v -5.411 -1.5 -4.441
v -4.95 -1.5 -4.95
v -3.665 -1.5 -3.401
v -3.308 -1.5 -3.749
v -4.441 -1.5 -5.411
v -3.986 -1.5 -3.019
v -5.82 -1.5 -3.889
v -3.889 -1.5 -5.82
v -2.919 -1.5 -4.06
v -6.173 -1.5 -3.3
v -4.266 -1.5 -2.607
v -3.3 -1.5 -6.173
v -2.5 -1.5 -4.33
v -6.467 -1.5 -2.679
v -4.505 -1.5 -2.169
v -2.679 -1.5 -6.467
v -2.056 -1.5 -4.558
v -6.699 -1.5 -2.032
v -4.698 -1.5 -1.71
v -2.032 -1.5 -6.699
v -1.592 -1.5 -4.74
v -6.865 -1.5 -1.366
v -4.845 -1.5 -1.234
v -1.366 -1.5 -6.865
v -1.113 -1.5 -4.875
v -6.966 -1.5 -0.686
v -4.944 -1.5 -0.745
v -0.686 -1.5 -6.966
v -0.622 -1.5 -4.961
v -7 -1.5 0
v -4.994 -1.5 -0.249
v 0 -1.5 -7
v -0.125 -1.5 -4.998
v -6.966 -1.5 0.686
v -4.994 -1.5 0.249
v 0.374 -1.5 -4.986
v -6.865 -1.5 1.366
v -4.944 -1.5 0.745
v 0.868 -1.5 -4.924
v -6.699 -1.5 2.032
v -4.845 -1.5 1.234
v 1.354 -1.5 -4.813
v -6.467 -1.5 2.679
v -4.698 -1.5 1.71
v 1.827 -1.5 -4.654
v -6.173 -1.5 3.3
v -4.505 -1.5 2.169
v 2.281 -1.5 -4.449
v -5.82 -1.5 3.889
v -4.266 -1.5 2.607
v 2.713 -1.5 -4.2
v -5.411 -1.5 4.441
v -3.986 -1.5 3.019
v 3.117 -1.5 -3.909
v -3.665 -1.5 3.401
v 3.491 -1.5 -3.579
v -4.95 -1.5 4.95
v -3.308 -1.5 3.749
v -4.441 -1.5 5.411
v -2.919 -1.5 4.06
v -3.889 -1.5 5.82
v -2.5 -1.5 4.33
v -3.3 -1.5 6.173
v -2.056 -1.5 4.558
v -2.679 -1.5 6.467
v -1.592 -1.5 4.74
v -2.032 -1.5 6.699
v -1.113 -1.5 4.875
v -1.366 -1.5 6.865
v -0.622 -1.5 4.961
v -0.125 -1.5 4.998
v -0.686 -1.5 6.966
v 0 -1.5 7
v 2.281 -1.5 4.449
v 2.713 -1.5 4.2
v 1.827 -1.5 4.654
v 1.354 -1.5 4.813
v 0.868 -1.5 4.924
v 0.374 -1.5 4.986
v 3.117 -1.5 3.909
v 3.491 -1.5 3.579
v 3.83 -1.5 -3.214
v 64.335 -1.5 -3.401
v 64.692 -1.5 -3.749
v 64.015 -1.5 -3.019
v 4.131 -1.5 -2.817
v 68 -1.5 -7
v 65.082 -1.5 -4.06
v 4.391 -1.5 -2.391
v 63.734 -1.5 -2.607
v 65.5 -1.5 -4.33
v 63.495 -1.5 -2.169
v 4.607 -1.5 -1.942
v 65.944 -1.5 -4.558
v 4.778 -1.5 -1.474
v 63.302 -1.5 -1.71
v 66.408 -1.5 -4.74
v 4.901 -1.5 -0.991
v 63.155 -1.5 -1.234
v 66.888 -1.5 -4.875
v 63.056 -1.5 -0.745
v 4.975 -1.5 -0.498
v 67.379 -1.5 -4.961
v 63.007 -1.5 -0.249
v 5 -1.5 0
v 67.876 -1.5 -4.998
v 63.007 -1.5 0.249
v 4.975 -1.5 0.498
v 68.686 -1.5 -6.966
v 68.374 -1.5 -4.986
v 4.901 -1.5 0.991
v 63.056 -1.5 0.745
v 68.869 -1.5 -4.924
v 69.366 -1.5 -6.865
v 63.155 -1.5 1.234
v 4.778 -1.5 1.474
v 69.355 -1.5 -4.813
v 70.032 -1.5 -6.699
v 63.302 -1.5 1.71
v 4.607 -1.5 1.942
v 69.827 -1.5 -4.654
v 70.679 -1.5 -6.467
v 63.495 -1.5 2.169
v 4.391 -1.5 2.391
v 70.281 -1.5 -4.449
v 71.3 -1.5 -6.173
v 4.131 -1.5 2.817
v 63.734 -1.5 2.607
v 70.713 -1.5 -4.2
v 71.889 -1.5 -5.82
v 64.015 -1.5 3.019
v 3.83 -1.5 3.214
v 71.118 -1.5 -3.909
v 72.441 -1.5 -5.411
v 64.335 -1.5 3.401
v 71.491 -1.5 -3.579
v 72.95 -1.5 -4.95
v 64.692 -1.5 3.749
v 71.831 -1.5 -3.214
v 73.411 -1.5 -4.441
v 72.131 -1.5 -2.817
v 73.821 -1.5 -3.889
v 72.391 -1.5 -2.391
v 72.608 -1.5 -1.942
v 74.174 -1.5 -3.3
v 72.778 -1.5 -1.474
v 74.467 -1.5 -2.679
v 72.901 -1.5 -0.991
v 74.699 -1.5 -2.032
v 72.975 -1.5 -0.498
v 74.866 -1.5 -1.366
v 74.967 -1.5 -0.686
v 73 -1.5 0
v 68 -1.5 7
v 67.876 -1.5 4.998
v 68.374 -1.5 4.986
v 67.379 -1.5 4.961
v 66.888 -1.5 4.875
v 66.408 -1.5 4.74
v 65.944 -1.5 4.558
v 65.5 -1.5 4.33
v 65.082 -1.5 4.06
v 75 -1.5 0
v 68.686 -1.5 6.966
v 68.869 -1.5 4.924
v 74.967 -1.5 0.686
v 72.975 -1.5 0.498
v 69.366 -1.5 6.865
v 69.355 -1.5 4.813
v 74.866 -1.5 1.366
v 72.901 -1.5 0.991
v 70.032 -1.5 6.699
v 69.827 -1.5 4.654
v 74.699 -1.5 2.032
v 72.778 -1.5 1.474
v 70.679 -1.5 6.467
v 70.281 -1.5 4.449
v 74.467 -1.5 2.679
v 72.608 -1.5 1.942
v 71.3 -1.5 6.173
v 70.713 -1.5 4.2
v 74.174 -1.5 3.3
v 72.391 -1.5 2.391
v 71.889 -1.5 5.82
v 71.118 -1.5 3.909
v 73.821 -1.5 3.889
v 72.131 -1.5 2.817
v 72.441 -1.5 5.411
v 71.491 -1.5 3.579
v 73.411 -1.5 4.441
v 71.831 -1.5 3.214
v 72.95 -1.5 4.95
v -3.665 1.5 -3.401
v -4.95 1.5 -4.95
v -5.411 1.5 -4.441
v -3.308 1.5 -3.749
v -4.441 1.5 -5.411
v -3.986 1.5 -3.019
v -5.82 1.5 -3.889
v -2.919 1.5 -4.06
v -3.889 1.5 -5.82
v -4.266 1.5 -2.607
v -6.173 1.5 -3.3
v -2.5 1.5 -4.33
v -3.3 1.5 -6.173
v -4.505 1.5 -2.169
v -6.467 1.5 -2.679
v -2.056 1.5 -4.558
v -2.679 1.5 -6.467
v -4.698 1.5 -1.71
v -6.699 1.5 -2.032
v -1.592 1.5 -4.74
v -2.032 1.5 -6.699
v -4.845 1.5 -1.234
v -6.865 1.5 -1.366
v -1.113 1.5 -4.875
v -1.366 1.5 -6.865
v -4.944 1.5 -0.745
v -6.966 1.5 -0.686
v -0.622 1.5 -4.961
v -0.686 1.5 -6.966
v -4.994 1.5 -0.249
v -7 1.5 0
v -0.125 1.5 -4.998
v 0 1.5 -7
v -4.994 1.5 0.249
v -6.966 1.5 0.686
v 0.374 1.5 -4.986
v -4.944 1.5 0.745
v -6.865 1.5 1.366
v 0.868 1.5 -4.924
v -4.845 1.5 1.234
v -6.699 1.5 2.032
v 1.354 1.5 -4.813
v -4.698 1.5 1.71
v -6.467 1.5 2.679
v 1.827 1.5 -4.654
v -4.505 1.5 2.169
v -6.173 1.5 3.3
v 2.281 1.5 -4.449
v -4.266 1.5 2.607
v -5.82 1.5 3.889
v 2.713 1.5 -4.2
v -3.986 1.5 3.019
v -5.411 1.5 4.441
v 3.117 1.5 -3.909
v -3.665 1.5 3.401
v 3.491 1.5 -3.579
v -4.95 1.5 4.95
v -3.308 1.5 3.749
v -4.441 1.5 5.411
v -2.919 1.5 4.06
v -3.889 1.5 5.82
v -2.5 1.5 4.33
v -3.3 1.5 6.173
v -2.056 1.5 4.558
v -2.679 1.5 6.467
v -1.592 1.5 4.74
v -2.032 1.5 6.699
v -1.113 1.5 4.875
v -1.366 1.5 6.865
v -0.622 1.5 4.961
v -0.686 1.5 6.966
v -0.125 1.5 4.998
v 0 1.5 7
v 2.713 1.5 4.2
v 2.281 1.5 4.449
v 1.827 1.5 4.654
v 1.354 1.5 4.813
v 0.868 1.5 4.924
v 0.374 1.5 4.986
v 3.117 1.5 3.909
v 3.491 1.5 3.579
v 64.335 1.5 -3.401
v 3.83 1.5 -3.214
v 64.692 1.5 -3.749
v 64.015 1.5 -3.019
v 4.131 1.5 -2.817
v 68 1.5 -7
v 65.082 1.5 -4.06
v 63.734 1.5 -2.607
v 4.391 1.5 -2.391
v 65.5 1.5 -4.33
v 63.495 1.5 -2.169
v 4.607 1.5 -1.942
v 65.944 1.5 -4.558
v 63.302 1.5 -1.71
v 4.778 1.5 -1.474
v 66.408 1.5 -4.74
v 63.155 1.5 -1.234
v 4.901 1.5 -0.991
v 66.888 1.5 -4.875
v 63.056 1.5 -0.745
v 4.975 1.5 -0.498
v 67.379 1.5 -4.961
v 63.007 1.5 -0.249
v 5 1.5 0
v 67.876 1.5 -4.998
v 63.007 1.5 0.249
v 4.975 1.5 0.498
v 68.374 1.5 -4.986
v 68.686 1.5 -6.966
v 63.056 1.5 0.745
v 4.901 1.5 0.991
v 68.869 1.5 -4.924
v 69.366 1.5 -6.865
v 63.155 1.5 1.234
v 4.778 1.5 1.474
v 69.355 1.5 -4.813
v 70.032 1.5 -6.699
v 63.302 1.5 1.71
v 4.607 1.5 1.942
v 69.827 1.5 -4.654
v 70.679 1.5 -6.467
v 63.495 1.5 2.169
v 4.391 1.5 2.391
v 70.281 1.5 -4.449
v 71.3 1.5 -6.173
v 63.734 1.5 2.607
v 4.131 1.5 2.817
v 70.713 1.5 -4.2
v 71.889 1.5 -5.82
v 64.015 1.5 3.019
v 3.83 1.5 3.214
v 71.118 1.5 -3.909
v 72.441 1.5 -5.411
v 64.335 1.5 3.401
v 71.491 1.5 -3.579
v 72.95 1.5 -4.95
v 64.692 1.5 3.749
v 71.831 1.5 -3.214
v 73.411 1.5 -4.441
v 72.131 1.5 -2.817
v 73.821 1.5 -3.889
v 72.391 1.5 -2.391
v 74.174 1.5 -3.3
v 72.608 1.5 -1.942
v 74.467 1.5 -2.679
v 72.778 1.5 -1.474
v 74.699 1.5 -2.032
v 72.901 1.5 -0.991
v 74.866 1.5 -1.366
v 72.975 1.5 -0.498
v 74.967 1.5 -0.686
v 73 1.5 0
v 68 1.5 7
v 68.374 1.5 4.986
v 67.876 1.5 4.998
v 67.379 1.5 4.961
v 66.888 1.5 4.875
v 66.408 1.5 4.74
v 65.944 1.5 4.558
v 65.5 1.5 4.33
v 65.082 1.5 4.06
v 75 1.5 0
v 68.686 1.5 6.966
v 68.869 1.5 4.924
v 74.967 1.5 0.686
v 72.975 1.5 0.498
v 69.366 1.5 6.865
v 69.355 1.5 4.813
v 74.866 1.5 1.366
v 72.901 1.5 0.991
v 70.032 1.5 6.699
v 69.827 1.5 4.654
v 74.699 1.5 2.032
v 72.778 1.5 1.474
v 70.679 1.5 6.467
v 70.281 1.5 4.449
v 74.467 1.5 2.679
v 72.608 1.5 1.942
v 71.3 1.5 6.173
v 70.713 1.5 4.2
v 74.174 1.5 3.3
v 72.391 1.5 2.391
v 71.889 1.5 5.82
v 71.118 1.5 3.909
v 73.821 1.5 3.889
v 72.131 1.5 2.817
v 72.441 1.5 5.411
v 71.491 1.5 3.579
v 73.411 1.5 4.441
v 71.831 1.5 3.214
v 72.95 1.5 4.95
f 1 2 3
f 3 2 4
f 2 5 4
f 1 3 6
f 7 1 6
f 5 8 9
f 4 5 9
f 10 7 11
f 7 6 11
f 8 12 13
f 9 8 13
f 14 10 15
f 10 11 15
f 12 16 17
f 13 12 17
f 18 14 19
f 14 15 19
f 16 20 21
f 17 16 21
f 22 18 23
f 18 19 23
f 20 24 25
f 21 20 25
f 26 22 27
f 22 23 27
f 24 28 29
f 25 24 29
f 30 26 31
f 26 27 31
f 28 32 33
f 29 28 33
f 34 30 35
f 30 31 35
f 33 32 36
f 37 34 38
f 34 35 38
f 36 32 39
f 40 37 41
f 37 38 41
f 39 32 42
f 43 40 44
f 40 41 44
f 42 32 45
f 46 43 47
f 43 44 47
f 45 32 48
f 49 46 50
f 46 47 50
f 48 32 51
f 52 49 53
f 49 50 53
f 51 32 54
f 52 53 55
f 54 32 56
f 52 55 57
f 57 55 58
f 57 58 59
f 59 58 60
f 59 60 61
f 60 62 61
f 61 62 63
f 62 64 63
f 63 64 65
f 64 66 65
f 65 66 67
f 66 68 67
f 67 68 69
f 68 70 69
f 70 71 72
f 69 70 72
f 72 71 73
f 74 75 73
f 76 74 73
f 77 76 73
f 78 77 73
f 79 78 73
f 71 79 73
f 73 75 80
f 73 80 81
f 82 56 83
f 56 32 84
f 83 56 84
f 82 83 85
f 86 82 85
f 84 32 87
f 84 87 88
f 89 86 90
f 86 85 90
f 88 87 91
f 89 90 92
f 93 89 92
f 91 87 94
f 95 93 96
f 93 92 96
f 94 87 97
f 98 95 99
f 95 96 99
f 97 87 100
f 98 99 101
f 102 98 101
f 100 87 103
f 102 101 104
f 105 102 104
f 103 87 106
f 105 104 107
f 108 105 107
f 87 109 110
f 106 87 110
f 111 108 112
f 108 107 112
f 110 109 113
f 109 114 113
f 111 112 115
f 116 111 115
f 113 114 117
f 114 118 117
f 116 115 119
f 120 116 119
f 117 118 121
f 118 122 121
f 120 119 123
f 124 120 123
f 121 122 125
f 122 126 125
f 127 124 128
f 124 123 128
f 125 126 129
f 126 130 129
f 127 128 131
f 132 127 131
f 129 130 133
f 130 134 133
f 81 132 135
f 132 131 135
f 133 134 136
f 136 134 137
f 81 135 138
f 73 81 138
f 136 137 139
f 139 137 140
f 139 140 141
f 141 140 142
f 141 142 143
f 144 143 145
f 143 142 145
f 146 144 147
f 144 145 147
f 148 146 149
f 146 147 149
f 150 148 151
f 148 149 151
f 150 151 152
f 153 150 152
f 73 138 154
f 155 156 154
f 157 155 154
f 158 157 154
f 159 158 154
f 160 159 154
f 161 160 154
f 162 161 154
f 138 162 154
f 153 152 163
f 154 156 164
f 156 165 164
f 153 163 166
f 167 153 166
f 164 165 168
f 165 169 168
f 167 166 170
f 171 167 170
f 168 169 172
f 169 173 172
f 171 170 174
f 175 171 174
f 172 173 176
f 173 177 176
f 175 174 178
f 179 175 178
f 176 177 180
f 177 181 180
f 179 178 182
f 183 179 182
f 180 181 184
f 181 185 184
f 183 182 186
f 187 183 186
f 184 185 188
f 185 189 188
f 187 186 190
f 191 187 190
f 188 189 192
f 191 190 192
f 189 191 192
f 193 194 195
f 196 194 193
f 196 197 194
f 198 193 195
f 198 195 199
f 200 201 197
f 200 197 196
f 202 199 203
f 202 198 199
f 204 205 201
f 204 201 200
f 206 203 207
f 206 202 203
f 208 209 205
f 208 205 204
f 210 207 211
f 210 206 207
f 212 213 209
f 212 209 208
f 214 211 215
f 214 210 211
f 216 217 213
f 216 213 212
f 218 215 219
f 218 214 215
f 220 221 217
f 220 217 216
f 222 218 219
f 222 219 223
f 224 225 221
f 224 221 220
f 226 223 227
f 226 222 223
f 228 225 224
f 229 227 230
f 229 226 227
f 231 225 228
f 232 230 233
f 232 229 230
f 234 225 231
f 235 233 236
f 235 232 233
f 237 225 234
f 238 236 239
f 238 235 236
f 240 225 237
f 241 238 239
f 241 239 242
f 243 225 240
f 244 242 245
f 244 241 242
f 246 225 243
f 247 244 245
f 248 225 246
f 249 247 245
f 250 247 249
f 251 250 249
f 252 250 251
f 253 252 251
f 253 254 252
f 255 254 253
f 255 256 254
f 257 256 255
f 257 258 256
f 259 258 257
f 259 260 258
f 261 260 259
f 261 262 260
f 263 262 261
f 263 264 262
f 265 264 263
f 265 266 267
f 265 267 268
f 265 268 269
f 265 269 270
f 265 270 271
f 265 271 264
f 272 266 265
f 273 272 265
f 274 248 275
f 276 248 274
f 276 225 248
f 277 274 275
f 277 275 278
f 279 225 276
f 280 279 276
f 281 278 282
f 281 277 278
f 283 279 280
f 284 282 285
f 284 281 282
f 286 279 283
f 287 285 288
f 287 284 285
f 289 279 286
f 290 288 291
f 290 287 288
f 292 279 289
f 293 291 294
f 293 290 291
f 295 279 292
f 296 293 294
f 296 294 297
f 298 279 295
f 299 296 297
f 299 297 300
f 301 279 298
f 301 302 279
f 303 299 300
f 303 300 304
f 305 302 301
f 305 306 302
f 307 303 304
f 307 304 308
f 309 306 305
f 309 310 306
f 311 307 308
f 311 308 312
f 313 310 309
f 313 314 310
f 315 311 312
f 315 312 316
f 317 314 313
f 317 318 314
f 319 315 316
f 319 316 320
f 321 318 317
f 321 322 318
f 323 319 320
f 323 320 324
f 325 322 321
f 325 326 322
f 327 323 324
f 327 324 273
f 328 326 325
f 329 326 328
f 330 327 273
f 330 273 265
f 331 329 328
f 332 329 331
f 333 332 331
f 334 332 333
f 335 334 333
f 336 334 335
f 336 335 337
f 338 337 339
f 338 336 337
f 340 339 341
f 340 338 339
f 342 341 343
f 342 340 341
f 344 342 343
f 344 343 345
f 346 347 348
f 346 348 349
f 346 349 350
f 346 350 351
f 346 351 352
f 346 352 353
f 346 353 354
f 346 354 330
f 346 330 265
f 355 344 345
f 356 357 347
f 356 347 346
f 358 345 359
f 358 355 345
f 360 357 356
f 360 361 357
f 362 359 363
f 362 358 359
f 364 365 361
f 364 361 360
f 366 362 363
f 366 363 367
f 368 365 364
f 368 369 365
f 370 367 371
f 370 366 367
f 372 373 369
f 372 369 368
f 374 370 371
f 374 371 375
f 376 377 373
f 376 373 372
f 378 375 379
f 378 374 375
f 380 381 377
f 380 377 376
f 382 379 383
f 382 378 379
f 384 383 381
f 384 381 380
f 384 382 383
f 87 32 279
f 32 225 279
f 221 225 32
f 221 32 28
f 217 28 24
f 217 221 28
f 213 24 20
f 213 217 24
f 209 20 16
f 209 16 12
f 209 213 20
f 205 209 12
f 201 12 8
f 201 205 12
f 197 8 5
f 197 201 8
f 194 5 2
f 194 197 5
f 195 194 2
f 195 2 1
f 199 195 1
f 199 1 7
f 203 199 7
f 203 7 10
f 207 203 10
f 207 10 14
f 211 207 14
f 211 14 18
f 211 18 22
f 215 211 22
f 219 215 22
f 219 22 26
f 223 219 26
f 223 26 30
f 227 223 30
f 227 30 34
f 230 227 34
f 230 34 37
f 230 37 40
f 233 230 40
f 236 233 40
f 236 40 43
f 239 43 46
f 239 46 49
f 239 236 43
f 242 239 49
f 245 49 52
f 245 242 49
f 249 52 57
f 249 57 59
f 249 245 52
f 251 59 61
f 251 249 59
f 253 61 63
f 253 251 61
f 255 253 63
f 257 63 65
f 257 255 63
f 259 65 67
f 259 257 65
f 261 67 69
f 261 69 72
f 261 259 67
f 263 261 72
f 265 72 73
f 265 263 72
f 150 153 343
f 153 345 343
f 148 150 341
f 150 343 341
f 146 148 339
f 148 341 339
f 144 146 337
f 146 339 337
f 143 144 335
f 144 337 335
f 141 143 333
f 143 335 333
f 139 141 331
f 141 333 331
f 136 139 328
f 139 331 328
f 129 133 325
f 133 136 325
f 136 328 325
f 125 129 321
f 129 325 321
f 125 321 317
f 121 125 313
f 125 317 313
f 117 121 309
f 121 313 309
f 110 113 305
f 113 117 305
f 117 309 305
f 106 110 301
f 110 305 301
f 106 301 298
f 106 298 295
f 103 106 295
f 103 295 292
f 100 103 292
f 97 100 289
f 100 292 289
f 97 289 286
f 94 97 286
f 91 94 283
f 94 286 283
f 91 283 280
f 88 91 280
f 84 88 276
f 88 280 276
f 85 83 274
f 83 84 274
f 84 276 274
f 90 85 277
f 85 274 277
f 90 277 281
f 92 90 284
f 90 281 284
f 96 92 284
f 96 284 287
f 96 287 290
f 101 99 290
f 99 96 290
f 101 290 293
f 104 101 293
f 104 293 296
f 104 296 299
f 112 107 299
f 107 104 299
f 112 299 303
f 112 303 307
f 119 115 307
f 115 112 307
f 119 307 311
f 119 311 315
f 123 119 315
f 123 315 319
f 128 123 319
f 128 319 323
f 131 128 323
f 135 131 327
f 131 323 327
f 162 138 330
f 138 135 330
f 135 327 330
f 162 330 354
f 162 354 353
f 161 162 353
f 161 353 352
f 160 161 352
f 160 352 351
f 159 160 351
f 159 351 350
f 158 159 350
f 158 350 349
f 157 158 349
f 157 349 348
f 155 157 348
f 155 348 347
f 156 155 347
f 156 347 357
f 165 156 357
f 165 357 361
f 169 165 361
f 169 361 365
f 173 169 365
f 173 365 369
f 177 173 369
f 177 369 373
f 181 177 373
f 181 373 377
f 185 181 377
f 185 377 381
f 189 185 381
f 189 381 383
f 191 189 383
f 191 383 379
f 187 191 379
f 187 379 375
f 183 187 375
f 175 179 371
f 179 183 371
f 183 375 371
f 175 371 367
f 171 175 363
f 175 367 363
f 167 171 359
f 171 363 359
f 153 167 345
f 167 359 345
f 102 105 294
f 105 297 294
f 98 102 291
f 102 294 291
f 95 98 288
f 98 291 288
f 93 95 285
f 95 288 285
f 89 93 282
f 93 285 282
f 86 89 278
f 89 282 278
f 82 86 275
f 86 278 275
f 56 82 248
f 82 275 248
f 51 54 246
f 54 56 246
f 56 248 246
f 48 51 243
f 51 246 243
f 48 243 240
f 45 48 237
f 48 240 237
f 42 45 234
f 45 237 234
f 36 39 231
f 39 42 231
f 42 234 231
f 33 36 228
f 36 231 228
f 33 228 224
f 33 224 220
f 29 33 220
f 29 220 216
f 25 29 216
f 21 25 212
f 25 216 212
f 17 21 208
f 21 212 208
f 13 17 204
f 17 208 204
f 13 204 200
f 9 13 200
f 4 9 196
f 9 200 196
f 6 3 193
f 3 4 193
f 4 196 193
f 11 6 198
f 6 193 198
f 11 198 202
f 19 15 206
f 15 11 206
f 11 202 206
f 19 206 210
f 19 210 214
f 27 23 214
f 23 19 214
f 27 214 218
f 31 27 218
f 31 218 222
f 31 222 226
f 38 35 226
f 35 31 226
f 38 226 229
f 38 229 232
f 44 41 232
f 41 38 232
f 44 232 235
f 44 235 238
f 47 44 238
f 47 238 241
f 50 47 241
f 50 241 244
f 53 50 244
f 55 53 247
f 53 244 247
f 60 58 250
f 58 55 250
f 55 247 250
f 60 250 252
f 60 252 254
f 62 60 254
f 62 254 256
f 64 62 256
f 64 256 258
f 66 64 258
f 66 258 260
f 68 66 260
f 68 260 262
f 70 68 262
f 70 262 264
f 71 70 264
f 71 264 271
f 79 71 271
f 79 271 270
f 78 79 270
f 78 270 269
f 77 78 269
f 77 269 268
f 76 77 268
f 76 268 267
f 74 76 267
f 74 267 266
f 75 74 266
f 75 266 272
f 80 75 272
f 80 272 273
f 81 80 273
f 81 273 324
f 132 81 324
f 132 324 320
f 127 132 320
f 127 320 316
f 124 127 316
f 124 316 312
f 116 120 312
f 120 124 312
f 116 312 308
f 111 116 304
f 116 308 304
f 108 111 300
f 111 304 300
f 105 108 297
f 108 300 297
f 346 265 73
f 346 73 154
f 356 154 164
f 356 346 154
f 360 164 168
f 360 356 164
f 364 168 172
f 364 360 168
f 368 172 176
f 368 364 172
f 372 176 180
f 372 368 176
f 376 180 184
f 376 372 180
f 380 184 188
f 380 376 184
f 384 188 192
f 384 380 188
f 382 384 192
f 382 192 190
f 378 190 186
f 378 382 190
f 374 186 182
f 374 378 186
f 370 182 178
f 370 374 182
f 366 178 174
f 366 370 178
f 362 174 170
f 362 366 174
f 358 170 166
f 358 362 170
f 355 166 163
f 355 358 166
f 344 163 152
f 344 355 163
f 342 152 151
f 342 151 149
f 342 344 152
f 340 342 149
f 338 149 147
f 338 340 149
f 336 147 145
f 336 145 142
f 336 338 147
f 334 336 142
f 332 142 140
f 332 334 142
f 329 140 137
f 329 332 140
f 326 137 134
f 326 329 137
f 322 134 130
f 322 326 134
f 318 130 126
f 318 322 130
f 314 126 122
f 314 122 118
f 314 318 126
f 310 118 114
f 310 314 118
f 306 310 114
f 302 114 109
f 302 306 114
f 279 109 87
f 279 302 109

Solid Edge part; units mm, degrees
sketch "Sketch1" plane through (0, 0, 0) normal (0, -1, 0) x (1, 0, 0)
  circle A0 centre (0, 0) radius 5
  line L0 (0, 7) -> (68.0003, 7)
  line L1 (0, -7) -> (68.0003, -7)
  arc A1 (0, -7) -> (0, 7) centre (0, 0) cw
  arc A2 (68.0003, 7) -> (68.0003, -7) centre (68.0003, 0) cw
  circle A3 centre (68.0003, 0) radius 5
extrude "Protrusion1" add sketch "Sketch1" along normal mid plane 3
properties part number "1976-1500-004" material "Aluminio, 7075-T6"
